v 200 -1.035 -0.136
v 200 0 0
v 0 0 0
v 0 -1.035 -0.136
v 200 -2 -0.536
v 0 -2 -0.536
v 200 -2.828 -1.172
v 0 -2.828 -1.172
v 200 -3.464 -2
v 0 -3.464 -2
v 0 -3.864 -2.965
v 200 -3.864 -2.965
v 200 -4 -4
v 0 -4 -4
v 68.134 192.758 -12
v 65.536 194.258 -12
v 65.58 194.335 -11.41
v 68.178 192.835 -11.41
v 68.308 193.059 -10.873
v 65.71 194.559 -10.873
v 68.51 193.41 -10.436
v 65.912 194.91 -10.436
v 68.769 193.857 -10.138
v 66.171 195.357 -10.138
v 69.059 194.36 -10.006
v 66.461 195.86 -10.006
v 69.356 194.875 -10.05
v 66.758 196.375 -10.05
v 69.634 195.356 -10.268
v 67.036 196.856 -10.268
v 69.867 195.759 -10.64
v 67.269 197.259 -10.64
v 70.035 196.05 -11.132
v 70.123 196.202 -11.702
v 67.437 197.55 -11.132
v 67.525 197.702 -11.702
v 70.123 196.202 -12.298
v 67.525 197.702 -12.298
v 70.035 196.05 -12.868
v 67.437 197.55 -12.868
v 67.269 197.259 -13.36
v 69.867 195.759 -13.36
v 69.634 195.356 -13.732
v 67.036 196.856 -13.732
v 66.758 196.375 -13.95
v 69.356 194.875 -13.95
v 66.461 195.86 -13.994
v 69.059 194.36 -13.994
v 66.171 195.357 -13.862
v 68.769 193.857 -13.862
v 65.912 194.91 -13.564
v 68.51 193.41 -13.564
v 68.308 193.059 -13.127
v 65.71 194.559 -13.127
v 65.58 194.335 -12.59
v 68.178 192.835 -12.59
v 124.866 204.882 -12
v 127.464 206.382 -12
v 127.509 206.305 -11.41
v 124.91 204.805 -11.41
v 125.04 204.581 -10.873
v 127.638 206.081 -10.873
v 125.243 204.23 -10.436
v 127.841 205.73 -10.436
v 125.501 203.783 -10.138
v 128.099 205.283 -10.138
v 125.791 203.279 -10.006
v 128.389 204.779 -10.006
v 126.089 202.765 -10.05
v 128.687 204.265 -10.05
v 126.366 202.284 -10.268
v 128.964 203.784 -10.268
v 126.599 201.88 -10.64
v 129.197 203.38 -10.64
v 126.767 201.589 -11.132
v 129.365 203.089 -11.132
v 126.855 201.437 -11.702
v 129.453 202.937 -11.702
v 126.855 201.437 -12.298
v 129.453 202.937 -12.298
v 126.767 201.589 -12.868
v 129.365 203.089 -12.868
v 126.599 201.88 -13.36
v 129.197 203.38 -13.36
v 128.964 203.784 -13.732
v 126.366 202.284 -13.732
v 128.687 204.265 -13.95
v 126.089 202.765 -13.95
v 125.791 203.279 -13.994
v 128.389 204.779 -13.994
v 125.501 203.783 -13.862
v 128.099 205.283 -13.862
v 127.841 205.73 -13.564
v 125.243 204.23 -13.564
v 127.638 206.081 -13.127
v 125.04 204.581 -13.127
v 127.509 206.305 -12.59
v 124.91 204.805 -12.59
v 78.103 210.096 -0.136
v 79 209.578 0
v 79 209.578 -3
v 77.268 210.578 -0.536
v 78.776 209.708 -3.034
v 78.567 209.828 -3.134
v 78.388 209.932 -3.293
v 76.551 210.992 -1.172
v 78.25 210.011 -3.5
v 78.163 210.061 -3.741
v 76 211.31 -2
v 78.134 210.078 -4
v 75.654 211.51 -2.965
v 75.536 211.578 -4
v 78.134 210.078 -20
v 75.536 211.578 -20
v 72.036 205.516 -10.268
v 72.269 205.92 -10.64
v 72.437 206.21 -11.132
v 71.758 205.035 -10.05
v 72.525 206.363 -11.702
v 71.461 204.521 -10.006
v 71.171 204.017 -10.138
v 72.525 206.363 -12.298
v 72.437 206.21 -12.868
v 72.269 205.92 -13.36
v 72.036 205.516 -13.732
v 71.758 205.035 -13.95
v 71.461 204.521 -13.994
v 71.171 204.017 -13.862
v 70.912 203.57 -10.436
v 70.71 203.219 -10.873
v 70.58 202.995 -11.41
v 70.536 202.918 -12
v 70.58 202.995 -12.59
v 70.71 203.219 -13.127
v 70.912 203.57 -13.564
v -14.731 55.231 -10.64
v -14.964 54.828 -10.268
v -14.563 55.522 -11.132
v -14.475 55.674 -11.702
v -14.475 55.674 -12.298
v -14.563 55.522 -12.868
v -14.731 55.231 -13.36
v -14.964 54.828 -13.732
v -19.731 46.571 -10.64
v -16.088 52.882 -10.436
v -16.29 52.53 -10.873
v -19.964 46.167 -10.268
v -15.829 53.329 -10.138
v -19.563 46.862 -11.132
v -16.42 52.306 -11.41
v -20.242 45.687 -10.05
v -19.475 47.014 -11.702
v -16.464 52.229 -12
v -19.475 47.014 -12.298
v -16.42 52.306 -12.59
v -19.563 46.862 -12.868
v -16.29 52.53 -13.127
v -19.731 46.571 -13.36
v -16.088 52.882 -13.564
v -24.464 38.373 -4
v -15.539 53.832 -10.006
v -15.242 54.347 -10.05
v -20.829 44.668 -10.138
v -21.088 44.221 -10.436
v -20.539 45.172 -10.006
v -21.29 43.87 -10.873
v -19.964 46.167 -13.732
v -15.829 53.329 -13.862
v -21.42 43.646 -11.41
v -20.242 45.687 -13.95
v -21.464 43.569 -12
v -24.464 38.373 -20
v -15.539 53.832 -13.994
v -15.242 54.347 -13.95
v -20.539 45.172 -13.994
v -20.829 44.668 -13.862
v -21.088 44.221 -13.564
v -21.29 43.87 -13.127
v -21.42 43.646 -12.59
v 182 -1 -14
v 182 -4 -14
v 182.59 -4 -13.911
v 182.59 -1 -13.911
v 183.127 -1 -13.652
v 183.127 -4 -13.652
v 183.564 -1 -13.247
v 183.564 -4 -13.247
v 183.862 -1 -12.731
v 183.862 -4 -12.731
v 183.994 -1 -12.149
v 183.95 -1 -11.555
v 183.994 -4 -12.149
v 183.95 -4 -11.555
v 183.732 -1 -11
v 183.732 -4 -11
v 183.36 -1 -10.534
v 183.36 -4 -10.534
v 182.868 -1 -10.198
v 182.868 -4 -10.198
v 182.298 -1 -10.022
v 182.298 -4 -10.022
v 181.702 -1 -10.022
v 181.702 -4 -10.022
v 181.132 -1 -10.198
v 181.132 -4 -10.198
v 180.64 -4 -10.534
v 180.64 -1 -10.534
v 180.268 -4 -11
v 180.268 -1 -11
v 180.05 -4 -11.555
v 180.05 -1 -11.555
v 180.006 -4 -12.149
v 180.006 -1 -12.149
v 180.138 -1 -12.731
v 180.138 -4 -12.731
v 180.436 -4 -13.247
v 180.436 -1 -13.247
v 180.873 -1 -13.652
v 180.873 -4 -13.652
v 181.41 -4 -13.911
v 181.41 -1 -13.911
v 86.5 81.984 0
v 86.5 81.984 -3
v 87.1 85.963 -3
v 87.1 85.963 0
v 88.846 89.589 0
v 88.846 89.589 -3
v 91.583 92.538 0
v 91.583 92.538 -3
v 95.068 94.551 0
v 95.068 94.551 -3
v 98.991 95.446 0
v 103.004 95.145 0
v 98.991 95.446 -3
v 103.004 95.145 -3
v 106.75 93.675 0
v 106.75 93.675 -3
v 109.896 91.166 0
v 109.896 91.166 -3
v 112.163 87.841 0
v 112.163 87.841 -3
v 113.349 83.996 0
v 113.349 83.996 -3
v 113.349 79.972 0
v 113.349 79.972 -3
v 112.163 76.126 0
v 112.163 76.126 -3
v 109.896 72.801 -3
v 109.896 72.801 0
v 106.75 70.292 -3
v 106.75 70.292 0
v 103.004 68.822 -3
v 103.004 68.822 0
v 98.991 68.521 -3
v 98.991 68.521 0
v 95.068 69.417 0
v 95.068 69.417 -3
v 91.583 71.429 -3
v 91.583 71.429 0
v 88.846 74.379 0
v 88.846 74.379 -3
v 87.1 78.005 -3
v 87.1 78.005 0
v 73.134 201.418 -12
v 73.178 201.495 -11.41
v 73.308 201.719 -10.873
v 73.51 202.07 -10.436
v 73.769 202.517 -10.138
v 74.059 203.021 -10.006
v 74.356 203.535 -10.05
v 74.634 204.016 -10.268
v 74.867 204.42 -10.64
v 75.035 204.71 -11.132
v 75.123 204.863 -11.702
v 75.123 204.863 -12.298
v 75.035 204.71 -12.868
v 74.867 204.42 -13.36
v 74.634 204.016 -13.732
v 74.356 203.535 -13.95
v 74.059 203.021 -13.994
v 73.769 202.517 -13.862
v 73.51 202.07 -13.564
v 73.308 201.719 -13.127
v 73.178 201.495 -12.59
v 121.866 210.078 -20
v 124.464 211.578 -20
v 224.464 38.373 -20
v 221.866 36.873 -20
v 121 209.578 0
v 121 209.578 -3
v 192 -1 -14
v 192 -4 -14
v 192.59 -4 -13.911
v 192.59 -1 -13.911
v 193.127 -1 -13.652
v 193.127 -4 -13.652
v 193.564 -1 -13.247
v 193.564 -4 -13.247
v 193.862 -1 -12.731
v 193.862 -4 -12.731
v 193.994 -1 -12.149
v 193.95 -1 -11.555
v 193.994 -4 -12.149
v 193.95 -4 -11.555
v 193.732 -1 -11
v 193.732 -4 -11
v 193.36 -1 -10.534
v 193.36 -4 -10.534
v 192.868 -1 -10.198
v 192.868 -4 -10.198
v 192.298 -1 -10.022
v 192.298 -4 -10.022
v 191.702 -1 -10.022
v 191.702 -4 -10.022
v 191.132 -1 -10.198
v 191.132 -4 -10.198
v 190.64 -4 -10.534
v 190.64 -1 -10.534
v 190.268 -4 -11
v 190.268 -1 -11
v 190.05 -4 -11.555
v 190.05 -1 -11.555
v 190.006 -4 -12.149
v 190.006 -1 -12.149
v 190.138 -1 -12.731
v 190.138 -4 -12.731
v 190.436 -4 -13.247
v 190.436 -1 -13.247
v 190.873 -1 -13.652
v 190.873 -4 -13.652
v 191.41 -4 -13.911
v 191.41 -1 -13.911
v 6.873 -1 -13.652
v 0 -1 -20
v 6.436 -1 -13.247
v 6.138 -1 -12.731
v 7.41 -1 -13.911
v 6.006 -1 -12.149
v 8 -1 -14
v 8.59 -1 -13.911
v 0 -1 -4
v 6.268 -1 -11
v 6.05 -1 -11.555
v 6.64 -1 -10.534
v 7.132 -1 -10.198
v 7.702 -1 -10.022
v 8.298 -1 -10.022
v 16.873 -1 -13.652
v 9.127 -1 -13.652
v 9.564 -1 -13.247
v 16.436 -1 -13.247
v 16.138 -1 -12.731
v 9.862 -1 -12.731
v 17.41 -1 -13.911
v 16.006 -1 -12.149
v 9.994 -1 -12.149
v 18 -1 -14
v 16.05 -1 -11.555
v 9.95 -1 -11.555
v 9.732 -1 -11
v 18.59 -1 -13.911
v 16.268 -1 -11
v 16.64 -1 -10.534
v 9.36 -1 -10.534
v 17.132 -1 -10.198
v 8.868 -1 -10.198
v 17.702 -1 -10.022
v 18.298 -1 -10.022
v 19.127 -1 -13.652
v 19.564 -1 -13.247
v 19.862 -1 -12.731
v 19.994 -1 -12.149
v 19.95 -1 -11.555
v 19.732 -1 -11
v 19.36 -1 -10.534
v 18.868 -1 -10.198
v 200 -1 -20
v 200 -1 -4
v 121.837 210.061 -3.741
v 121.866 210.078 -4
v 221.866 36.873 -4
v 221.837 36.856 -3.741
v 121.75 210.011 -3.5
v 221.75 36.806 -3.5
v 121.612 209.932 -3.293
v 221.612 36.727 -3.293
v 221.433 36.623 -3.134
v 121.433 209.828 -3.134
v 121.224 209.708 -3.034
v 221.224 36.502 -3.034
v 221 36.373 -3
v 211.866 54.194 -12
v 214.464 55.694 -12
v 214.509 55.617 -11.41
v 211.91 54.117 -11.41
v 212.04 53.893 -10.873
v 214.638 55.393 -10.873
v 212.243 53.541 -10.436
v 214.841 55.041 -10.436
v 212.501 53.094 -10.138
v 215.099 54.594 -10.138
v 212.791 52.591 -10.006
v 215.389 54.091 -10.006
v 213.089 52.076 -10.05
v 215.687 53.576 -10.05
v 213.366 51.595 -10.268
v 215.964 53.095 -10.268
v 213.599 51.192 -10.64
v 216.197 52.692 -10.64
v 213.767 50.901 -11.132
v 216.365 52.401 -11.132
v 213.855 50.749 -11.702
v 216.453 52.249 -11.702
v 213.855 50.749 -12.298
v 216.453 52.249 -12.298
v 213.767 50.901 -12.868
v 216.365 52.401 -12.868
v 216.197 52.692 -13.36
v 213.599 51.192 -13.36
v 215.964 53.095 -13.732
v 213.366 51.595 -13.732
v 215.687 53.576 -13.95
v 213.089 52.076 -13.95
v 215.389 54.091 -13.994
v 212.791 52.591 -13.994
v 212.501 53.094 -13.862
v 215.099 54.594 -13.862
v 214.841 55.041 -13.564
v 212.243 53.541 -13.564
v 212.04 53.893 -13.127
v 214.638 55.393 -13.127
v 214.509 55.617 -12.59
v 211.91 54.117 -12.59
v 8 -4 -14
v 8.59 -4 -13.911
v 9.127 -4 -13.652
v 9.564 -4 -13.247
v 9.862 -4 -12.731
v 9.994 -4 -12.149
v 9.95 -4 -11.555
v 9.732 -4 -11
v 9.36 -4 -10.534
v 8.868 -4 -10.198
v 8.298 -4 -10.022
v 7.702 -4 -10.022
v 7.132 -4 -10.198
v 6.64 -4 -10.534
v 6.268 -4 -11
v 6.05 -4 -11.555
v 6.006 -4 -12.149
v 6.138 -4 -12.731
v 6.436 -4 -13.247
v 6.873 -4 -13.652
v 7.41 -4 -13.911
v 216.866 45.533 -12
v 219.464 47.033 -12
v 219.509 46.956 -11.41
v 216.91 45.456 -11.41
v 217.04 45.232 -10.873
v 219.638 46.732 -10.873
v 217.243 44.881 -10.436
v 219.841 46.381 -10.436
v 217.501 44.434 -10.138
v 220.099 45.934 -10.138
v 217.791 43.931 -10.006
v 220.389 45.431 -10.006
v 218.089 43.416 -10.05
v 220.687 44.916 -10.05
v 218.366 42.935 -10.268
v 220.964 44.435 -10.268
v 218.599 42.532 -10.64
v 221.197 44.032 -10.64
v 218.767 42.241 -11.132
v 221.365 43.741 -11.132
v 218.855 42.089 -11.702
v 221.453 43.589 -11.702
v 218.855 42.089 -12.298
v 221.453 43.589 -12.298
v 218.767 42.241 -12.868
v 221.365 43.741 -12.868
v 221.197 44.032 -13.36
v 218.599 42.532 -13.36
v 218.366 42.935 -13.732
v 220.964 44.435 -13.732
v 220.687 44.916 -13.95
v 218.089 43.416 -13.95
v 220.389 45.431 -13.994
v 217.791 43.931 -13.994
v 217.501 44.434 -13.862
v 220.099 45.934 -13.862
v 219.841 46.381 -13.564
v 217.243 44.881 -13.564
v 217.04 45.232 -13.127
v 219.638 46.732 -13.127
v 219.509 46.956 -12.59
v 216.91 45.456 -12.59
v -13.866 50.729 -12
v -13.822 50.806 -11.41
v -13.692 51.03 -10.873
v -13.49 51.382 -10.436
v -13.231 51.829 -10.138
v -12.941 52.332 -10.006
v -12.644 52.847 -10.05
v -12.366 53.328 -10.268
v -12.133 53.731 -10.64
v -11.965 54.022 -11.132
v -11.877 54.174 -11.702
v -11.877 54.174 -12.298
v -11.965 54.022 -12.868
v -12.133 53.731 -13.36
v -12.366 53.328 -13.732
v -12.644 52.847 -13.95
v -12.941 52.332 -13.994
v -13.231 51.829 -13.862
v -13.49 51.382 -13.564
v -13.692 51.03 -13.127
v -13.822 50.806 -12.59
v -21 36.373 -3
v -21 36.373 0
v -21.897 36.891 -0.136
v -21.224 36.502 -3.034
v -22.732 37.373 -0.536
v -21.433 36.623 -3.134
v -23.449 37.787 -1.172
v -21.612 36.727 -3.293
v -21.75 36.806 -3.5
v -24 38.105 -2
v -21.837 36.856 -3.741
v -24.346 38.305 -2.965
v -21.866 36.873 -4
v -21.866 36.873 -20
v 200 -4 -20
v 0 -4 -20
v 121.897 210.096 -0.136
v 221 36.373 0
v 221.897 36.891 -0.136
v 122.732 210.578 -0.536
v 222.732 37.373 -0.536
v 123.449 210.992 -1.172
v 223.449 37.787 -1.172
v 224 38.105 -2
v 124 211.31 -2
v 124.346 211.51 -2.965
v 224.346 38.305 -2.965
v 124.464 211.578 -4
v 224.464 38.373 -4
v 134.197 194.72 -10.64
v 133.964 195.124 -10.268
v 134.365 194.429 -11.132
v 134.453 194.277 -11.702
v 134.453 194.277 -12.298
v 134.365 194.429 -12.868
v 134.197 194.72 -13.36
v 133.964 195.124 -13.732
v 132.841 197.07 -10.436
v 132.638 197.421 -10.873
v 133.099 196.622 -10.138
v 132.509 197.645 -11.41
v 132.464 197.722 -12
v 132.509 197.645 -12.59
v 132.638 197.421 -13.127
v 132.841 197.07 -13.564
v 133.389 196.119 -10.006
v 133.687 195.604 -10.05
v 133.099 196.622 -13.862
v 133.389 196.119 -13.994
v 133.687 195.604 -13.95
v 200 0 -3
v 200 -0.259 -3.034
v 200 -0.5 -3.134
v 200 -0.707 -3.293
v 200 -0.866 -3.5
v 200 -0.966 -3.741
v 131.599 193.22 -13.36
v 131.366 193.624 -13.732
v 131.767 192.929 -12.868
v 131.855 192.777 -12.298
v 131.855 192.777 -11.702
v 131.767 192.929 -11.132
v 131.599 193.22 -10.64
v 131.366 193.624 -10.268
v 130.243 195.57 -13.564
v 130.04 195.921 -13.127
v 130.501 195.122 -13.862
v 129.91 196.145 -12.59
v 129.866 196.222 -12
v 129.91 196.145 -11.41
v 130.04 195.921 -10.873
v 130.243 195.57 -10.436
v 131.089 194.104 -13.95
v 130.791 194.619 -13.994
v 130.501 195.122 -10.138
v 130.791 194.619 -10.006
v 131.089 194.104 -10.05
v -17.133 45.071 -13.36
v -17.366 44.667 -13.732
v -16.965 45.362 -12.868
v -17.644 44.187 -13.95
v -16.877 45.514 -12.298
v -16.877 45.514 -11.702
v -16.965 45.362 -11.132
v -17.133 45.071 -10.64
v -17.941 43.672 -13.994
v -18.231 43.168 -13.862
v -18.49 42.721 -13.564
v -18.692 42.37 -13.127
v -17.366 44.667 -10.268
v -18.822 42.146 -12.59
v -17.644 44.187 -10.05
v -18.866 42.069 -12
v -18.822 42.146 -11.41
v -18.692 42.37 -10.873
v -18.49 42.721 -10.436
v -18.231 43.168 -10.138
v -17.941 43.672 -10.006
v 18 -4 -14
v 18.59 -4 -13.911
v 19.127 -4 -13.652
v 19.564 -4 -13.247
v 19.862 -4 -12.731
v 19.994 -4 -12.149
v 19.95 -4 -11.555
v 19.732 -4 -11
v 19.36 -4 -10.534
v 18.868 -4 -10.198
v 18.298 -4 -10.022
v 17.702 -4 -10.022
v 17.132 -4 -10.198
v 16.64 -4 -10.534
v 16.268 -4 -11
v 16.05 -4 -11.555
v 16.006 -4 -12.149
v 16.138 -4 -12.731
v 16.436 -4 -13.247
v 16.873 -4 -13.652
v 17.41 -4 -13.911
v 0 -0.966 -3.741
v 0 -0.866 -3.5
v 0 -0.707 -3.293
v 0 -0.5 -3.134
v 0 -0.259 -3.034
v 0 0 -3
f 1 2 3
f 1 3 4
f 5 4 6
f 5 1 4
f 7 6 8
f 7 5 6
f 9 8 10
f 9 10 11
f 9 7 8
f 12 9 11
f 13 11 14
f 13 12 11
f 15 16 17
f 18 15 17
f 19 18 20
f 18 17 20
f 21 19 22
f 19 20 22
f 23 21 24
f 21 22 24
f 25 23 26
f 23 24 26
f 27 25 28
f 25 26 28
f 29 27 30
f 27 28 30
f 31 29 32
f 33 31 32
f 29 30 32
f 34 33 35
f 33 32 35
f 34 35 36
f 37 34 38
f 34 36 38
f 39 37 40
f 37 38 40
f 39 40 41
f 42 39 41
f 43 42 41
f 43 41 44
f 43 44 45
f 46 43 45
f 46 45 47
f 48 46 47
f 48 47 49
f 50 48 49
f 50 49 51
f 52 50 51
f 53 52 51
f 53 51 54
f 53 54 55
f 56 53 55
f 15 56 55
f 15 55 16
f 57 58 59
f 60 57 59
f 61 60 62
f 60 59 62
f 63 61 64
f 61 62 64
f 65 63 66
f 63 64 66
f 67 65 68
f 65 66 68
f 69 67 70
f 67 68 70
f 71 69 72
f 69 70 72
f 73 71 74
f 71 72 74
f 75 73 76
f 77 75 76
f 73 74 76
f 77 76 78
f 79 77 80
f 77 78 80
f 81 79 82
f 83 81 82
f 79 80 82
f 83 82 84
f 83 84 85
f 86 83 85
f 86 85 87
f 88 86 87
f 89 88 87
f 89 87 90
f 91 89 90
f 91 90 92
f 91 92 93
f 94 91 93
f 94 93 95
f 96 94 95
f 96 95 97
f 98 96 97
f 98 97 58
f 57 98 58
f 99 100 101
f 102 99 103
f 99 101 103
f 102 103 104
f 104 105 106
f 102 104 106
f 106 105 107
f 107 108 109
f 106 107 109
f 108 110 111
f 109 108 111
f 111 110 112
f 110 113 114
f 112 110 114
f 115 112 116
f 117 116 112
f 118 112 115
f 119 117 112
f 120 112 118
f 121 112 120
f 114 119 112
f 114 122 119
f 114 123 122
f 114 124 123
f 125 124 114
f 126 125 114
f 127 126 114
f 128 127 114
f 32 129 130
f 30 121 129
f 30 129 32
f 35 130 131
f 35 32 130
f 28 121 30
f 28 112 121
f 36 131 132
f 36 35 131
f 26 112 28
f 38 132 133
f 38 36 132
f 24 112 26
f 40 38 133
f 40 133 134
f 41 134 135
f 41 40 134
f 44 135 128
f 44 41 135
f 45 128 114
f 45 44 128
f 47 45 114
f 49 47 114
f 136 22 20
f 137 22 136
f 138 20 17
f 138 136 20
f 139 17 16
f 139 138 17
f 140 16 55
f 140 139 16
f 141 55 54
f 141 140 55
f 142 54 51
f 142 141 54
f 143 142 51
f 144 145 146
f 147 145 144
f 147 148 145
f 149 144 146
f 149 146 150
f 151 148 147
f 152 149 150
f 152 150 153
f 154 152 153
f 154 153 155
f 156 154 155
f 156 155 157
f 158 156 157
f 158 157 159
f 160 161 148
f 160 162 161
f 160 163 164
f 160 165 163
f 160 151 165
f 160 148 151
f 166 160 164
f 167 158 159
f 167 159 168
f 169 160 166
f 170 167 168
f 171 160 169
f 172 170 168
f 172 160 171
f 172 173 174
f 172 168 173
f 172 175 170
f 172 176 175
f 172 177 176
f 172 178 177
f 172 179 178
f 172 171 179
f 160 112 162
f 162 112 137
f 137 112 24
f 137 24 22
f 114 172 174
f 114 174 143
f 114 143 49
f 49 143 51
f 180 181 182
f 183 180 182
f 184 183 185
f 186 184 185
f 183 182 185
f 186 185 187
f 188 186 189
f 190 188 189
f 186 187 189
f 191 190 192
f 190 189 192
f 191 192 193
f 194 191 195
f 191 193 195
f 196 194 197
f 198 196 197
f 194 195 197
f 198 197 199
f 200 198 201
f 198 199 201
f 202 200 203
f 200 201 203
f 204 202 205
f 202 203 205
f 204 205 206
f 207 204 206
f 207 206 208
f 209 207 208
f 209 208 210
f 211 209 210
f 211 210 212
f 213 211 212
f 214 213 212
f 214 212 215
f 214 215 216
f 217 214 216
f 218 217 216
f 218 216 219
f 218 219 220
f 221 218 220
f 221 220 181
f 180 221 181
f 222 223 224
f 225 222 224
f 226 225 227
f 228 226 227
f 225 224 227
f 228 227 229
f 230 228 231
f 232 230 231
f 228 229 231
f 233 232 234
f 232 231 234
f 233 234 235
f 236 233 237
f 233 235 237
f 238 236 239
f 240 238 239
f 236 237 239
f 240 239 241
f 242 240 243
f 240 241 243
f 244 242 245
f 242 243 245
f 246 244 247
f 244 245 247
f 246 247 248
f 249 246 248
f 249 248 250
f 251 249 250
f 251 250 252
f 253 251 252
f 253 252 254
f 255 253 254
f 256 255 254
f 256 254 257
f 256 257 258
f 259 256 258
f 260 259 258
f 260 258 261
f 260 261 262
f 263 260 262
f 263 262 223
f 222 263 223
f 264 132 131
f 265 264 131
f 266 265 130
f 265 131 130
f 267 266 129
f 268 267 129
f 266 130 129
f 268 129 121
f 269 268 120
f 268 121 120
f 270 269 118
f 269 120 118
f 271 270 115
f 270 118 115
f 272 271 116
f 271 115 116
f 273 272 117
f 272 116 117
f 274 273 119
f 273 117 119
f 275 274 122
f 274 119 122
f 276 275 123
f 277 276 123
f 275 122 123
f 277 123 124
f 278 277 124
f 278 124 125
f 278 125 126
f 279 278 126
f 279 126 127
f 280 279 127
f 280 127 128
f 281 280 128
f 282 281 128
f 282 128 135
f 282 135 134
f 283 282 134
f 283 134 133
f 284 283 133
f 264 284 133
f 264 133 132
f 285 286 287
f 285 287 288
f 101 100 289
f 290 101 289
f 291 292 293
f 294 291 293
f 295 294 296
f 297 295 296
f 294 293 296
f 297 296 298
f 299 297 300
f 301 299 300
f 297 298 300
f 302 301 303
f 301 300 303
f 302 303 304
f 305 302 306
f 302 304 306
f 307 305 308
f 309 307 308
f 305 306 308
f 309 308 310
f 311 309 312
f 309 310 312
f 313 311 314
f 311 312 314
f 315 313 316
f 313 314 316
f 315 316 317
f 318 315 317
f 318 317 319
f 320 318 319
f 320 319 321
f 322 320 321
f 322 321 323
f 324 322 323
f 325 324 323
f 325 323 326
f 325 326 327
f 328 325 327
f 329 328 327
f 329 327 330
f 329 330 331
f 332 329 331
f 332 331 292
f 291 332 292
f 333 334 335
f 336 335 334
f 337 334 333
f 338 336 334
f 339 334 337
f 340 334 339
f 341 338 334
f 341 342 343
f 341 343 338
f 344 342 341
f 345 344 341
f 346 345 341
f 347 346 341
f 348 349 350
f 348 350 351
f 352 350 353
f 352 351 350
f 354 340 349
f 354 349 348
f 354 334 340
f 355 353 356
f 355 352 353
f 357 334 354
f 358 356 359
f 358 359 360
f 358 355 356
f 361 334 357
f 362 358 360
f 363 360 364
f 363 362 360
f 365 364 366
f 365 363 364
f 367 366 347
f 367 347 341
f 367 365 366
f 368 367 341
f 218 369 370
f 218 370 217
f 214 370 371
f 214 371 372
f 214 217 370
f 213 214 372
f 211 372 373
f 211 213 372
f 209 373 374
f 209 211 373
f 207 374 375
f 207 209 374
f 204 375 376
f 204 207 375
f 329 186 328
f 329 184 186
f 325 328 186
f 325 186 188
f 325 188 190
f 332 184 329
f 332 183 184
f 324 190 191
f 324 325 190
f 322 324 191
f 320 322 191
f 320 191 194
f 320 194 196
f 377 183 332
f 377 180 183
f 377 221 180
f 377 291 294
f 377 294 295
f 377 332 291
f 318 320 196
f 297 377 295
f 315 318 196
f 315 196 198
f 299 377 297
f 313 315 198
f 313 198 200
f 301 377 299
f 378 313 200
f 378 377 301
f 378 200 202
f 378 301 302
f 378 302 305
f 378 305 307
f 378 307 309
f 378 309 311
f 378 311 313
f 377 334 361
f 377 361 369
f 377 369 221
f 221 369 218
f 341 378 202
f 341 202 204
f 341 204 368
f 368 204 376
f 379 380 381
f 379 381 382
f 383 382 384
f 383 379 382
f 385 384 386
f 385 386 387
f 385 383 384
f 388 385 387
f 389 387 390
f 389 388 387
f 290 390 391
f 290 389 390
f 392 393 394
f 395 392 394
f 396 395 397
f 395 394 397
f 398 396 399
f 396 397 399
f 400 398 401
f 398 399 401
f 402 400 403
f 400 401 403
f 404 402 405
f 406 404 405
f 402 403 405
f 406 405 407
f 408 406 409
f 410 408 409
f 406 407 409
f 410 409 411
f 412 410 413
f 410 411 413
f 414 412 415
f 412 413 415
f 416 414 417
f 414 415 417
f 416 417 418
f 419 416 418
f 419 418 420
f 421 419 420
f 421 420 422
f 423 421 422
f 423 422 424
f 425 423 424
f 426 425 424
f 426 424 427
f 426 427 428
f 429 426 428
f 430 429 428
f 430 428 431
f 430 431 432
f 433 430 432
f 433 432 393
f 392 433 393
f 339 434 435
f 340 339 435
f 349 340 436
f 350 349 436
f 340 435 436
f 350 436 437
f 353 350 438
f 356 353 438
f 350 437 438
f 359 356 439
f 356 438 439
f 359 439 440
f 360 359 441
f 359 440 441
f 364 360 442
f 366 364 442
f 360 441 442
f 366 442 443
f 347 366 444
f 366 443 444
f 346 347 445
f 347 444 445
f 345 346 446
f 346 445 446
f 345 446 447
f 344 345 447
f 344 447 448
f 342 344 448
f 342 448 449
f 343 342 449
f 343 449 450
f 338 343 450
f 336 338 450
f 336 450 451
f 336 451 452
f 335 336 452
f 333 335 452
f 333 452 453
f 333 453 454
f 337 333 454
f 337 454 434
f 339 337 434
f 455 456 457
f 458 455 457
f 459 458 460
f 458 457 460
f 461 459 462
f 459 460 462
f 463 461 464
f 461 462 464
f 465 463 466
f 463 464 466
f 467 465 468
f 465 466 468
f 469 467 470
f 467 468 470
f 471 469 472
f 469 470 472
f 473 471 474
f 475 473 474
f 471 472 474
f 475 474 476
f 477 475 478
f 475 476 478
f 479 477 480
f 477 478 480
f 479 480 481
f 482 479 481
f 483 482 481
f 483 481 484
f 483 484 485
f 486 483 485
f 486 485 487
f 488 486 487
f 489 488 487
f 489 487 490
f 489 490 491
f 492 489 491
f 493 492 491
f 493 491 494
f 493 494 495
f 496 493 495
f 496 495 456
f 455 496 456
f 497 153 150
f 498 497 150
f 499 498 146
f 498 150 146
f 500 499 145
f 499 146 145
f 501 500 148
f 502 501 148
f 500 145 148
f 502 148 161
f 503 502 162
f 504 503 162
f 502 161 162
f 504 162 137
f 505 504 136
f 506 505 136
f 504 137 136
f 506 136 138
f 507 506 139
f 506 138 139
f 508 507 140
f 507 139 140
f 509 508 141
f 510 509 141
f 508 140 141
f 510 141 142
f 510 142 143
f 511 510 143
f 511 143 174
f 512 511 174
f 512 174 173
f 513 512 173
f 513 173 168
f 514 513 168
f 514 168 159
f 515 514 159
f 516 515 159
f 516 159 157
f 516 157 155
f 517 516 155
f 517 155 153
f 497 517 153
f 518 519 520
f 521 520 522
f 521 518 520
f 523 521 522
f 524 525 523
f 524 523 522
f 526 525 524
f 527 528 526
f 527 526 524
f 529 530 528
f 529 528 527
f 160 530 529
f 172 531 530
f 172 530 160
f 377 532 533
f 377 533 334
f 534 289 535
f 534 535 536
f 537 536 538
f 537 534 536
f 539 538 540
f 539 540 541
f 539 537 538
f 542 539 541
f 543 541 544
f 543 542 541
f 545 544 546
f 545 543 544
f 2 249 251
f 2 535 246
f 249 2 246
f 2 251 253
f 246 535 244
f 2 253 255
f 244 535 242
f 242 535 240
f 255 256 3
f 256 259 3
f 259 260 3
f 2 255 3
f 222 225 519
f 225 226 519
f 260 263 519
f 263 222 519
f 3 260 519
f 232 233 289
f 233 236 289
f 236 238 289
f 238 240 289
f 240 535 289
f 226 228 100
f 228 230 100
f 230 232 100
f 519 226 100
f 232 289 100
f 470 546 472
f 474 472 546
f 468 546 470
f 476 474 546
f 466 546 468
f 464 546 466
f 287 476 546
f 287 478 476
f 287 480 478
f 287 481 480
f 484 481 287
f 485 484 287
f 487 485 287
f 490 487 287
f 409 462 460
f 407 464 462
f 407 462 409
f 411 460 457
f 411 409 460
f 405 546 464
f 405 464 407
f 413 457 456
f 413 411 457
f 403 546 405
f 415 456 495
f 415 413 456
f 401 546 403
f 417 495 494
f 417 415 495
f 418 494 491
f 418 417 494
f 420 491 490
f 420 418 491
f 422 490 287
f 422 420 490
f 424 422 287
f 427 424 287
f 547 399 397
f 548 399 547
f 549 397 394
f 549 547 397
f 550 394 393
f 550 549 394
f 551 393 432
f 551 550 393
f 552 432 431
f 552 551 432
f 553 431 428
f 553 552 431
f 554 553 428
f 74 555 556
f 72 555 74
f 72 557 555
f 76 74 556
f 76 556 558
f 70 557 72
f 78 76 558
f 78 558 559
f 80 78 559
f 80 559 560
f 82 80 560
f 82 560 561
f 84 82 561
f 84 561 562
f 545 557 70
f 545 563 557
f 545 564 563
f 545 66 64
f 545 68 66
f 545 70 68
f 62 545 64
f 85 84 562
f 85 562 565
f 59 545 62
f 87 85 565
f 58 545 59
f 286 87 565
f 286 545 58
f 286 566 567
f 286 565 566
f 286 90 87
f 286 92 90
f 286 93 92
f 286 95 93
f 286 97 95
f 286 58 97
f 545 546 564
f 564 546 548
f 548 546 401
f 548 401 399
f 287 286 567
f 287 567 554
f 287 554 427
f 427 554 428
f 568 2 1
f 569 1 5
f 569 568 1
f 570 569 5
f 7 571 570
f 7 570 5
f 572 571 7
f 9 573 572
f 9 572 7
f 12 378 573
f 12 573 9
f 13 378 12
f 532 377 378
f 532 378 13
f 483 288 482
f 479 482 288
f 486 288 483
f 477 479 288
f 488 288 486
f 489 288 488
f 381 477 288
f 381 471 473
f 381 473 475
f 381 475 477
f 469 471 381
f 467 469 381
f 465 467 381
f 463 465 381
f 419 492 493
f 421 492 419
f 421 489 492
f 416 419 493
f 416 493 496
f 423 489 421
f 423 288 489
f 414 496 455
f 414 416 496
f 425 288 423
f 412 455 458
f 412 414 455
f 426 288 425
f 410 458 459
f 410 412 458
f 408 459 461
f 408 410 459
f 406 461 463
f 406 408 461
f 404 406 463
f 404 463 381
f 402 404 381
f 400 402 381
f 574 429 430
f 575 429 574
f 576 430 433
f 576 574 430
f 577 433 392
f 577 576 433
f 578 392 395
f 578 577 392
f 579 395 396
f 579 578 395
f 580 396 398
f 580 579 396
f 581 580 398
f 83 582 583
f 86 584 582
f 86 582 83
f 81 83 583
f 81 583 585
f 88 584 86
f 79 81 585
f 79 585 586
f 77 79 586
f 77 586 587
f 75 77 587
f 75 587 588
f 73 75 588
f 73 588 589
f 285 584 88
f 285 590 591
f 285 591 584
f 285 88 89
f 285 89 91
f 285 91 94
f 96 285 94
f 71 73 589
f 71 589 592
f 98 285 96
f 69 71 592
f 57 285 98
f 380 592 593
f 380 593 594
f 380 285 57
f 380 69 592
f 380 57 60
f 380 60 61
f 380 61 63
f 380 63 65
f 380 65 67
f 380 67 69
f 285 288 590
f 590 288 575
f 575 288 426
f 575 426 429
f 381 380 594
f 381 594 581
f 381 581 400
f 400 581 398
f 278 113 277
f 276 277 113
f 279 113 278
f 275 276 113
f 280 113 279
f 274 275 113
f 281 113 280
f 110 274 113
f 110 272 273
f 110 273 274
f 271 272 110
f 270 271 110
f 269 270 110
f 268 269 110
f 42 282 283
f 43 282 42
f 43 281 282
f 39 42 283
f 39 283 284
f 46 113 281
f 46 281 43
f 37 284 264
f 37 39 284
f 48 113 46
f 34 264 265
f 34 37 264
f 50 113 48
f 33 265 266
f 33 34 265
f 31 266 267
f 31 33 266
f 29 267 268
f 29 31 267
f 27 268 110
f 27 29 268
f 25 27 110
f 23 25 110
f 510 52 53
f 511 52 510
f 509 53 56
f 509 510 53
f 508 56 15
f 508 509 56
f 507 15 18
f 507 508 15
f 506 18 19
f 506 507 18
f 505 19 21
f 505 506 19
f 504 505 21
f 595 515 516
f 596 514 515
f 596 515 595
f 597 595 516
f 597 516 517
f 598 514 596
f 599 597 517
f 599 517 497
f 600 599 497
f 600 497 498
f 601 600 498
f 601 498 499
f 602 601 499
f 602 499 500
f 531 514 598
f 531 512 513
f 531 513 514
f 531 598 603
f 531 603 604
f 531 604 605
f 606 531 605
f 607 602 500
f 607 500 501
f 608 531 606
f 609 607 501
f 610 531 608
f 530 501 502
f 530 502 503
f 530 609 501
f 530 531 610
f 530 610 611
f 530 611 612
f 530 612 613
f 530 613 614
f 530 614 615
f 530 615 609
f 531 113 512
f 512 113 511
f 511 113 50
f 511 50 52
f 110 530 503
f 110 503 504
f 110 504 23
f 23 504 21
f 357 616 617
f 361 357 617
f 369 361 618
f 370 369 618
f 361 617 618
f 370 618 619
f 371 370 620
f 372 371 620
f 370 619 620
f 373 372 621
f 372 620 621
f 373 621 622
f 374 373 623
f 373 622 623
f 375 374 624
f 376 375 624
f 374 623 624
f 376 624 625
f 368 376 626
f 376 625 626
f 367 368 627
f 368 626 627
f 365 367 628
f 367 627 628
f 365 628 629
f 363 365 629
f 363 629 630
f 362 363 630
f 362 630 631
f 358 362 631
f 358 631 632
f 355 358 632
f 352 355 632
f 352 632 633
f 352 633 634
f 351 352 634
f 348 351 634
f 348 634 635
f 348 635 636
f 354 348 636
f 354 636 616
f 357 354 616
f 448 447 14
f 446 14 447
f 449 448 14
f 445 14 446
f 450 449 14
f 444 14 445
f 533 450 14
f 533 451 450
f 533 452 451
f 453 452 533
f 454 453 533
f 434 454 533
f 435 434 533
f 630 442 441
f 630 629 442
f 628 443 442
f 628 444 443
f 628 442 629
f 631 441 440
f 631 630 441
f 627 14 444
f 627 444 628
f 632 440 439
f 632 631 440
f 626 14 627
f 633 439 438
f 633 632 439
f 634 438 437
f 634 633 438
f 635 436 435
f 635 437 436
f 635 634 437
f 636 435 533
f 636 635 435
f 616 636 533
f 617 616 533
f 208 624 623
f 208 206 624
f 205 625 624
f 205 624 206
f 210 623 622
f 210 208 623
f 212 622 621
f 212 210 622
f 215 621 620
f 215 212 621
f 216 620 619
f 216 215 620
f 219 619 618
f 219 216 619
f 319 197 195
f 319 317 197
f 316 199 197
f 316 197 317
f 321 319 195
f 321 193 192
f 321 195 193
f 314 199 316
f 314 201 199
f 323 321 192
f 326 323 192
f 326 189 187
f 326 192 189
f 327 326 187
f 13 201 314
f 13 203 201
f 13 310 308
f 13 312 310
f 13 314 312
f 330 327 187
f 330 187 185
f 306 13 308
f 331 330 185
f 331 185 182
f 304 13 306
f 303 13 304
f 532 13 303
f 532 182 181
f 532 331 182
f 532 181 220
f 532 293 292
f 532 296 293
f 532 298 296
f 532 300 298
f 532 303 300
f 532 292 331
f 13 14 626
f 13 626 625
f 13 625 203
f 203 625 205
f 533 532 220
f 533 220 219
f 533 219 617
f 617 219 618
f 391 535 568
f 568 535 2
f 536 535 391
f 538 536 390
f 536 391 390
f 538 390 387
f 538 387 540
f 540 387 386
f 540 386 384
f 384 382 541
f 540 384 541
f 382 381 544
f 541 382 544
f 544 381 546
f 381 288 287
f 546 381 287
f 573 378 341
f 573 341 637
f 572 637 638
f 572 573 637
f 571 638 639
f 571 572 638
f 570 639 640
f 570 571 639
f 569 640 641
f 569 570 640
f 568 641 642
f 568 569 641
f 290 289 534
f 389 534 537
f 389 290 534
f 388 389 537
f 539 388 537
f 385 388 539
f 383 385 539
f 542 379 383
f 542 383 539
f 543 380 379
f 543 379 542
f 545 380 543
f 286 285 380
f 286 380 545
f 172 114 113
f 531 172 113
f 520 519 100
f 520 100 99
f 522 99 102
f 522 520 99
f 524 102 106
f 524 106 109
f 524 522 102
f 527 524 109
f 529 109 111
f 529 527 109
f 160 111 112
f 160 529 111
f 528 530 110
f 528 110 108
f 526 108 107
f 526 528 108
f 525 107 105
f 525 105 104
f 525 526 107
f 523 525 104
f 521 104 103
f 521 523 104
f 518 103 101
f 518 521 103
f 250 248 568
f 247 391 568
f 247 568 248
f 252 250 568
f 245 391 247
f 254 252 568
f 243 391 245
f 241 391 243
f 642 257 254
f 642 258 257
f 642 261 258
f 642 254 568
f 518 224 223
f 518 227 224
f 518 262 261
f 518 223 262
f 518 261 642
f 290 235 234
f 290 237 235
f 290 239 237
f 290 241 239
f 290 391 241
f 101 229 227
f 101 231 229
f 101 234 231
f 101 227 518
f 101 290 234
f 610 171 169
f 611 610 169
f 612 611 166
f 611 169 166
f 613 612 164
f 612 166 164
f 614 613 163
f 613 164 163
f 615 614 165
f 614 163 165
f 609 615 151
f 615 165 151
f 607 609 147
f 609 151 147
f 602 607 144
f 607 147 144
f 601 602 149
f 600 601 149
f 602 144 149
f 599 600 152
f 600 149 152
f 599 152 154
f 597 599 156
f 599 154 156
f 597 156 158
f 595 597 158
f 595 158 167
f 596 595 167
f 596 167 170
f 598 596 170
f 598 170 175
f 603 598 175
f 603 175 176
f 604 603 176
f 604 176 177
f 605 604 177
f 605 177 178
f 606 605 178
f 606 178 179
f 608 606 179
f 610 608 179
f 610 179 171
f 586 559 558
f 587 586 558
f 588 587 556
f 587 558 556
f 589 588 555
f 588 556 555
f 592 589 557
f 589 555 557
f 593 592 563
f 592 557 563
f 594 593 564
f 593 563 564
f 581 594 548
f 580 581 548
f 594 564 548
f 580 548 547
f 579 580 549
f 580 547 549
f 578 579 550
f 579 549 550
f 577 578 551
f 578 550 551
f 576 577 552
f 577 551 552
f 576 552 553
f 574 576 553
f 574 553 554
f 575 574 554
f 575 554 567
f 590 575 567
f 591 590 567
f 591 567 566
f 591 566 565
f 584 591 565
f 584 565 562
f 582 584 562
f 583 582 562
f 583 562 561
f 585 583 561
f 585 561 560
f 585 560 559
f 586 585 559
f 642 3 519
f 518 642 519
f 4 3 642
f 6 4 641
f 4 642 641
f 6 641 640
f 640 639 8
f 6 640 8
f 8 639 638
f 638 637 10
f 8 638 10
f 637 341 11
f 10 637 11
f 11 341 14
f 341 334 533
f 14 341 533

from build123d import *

# Parameters (mm, degrees)
SM_BASE_FLANGE_3_DEPTH        = 3
SM_EDGE_FLANGE_6_DEPTH        = 200
SM_EDGE_FLANGE_6_BEND_DEPTH   = 200
SM_EDGE_FLANGE_6_BEND_2_DEPTH = 200
CUT_EXTRUDE_4_REACH           = 325.007
SKETCH_47_R                   = 2
CUT_EXTRUDE_6_REACH           = 239.77
SKETCH_50_R                   = 2
CUT_EXTRUDE_7_REACH           = 313.862
SKETCH_51_R                   = 2
CUT_EXTRUDE_8_REACH           = 310.931
SKETCH_52_R                   = 13.5


# Sheet-metal steps are written as plain solids
with BuildPart() as part:
    # Эскиз10 → Базовая кромка3 (new body)
    with BuildSketch(Plane.XY):
        Polygon((0, 0), (-21, 36.373066959), (79, 209.578147716), (121, 209.578147716), (221, 36.373066959), (200, 0), align=None)
    extrude(amount=-SM_BASE_FLANGE_3_DEPTH)

    # Ребро-кромка6 section (across the edge) → Ребро-кромка6 (add)
    with BuildSketch(Plane(origin=(-21.866025404, 36.873066959, -3), x_dir=(0.8660254037844437, -0.4999999999999915, -3.4914813388431334e-15), z_dir=(0.4999999999999915, 0.8660254037844437, 0))):
        with BuildLine():
            Line((-3, 1), (-3, 17))
            Line((-3, 17), (0, 17))
            Line((0, 17), (0, 1))
            ThreePointArc((0, 1), (0.292893219, 0.292893219), (1, 0))
            Line((1, 0), (1, -3))
            ThreePointArc((1, -3), (-1.828427125, -1.828427125), (-3, 1))
        make_face()
    extrude(amount=SM_EDGE_FLANGE_6_DEPTH)

    # Ребро-кромка6 section 2 (across the edge) → Ребро-кромка6 bend (add)
    with BuildSketch(Plane(origin=(121.866025404, 210.078147716, -3), x_dir=(-0.8660254037844362, -0.5000000000000044, -3.491481338843134e-15), z_dir=(0.5000000000000044, -0.8660254037844362, 0))):
        with BuildLine():
            Line((-3, 1), (-3, 17))
            Line((-3, 17), (0, 17))
            Line((0, 17), (0, 1))
            ThreePointArc((0, 1), (0.292893219, 0.292893219), (1, 0))
            Line((1, 0), (1, -3))
            ThreePointArc((1, -3), (-1.828427125, -1.828427125), (-3, 1))
        make_face()
    extrude(amount=SM_EDGE_FLANGE_6_BEND_DEPTH)

    # Ребро-кромка6 section 3 (across the edge) → Ребро-кромка6 bend 2 (add)
    with BuildSketch(Plane(origin=(200, -1, -3), x_dir=(0, 1, 0), z_dir=(-1, 0, 0))):
        with BuildLine():
            Line((-3, 1), (-3, 17))
            Line((-3, 17), (0, 17))
            Line((0, 17), (0, 1))
            ThreePointArc((0, 1), (0.292893219, 0.292893219), (1, 0))
            Line((1, 0), (1, -3))
            ThreePointArc((1, -3), (-1.828427125, -1.828427125), (-3, 1))
        make_face()
    extrude(amount=SM_EDGE_FLANGE_6_BEND_2_DEPTH)

    # Эскиз47 → Вырез-Вытянуть4 (cut, up to next)
    with BuildSketch(Plane(origin=(-34.964101615, 20.186533479, 0), x_dir=(0, 0, 1), z_dir=(-0.866025403784443, 0.4999999999999925, 3.788649256556814e-15)), mode=Mode.PRIVATE) as cut_extrude_4_sk1:
        with Locations(Location((-12, 29, 0), (0, 0, 270))):
            Circle(SKETCH_47_R)
    cut_extrude_4_tool1 = extrude(cut_extrude_4_sk1.sketch, amount=-CUT_EXTRUDE_4_REACH, mode=Mode.PRIVATE) & part.part
    # Эскиз47 → Вырез-Вытянуть4 (cut, up to next)
    with BuildSketch(Plane(origin=(-34.964101615, 20.186533479, 0), x_dir=(0, 0, 1), z_dir=(-0.866025403784443, 0.4999999999999925, 3.788649256556814e-15)), mode=Mode.PRIVATE) as cut_extrude_4_sk2:
        with Locations(Location((-12, 39, 0), (0, 0, 270))):
            Circle(SKETCH_47_R)
    cut_extrude_4_tool2 = extrude(cut_extrude_4_sk2.sketch, amount=-CUT_EXTRUDE_4_REACH, mode=Mode.PRIVATE) & part.part
    # Эскиз47 → Вырез-Вытянуть4 (cut, up to next)
    with BuildSketch(Plane(origin=(-34.964101615, 20.186533479, 0), x_dir=(0, 0, 1), z_dir=(-0.866025403784443, 0.4999999999999925, 3.788649256556814e-15)), mode=Mode.PRIVATE) as cut_extrude_4_sk3:
        with Locations(Location((-12, 203, 0), (0, 0, 270))):
            Circle(SKETCH_47_R)
    cut_extrude_4_tool3 = extrude(cut_extrude_4_sk3.sketch, amount=-CUT_EXTRUDE_4_REACH, mode=Mode.PRIVATE) & part.part
    # Эскиз47 → Вырез-Вытянуть4 (cut, up to next)
    with BuildSketch(Plane(origin=(-34.964101615, 20.186533479, 0), x_dir=(0, 0, 1), z_dir=(-0.866025403784443, 0.4999999999999925, 3.788649256556814e-15)), mode=Mode.PRIVATE) as cut_extrude_4_sk4:
        with Locations(Location((-12, 213, 0), (0, 0, 270))):
            Circle(SKETCH_47_R)
    cut_extrude_4_tool4 = extrude(cut_extrude_4_sk4.sketch, amount=-CUT_EXTRUDE_4_REACH, mode=Mode.PRIVATE) & part.part
    add(cut_extrude_4_tool1.solids().sort_by_distance((-20.464102, 45.30127, -12))[0], mode=Mode.SUBTRACT)
    add(cut_extrude_4_tool2.solids().sort_by_distance((-15.464102, 53.961524, -12))[0], mode=Mode.SUBTRACT)
    add(cut_extrude_4_tool3.solids().sort_by_distance((66.535898, 195.98969, -12))[0], mode=Mode.SUBTRACT)
    add(cut_extrude_4_tool4.solids().sort_by_distance((71.535898, 204.649944, -12))[0], mode=Mode.SUBTRACT)

    # Эскиз50 → Вырез-Вытянуть6 (cut, up to next)
    with BuildSketch(Plane(origin=(184.964101615, 106.789073858, 0), x_dir=(0, 0, -1), z_dir=(0.866025403784436, 0.5000000000000047, 3.0623287353932815e-15)), mode=Mode.PRIVATE) as cut_extrude_6_sk1:
        with Locations(Location((12, -71, 0), (0, 0, 90))):
            Circle(SKETCH_50_R)
    cut_extrude_6_tool1 = extrude(cut_extrude_6_sk1.sketch, amount=-CUT_EXTRUDE_6_REACH, mode=Mode.PRIVATE) & part.part
    # Эскиз50 → Вырез-Вытянуть6 (cut, up to next)
    with BuildSketch(Plane(origin=(184.964101615, 106.789073858, 0), x_dir=(0, 0, -1), z_dir=(0.866025403784436, 0.5000000000000047, 3.0623287353932815e-15)), mode=Mode.PRIVATE) as cut_extrude_6_sk2:
        with Locations(Location((12, -61, 0), (0, 0, 90))):
            Circle(SKETCH_50_R)
    cut_extrude_6_tool2 = extrude(cut_extrude_6_sk2.sketch, amount=-CUT_EXTRUDE_6_REACH, mode=Mode.PRIVATE) & part.part
    # Эскиз50 → Вырез-Вытянуть6 (cut, up to next)
    with BuildSketch(Plane(origin=(184.964101615, 106.789073858, 0), x_dir=(0, 0, -1), z_dir=(0.866025403784436, 0.5000000000000047, 3.0623287353932815e-15)), mode=Mode.PRIVATE) as cut_extrude_6_sk3:
        with Locations(Location((12, 103, 0), (0, 0, 90))):
            Circle(SKETCH_50_R)
    cut_extrude_6_tool3 = extrude(cut_extrude_6_sk3.sketch, amount=-CUT_EXTRUDE_6_REACH, mode=Mode.PRIVATE) & part.part
    # Эскиз50 → Вырез-Вытянуть6 (cut, up to next)
    with BuildSketch(Plane(origin=(184.964101615, 106.789073858, 0), x_dir=(0, 0, -1), z_dir=(0.866025403784436, 0.5000000000000047, 3.0623287353932815e-15)), mode=Mode.PRIVATE) as cut_extrude_6_sk4:
        with Locations(Location((12, 113, 0), (0, 0, 90))):
            Circle(SKETCH_50_R)
    cut_extrude_6_tool4 = extrude(cut_extrude_6_sk4.sketch, amount=-CUT_EXTRUDE_6_REACH, mode=Mode.PRIVATE) & part.part
    add(cut_extrude_6_tool1.solids().sort_by_distance((220.464102, 45.30127, -12))[0], mode=Mode.SUBTRACT)
    add(cut_extrude_6_tool2.solids().sort_by_distance((215.464102, 53.961524, -12))[0], mode=Mode.SUBTRACT)
    add(cut_extrude_6_tool3.solids().sort_by_distance((133.464102, 195.98969, -12))[0], mode=Mode.SUBTRACT)
    add(cut_extrude_6_tool4.solids().sort_by_distance((128.464102, 204.649944, -12))[0], mode=Mode.SUBTRACT)

    # Эскиз51 → Вырез-Вытянуть7 (cut, up to next)
    with BuildSketch(Plane.XZ.offset(4), mode=Mode.PRIVATE) as cut_extrude_7_sk1:
        with Locations(Location((192, -12, 0), (0, 0, 270))):
            Circle(SKETCH_51_R)
    cut_extrude_7_tool1 = extrude(cut_extrude_7_sk1.sketch, amount=-CUT_EXTRUDE_7_REACH, mode=Mode.PRIVATE) & part.part
    # Эскиз51 → Вырез-Вытянуть7 (cut, up to next)
    with BuildSketch(Plane.XZ.offset(4), mode=Mode.PRIVATE) as cut_extrude_7_sk2:
        with Locations(Location((182, -12, 0), (0, 0, 270))):
            Circle(SKETCH_51_R)
    cut_extrude_7_tool2 = extrude(cut_extrude_7_sk2.sketch, amount=-CUT_EXTRUDE_7_REACH, mode=Mode.PRIVATE) & part.part
    # Эскиз51 → Вырез-Вытянуть7 (cut, up to next)
    with BuildSketch(Plane.XZ.offset(4), mode=Mode.PRIVATE) as cut_extrude_7_sk3:
        with Locations(Location((18, -12, 0), (0, 0, 270))):
            Circle(SKETCH_51_R)
    cut_extrude_7_tool3 = extrude(cut_extrude_7_sk3.sketch, amount=-CUT_EXTRUDE_7_REACH, mode=Mode.PRIVATE) & part.part
    # Эскиз51 → Вырез-Вытянуть7 (cut, up to next)
    with BuildSketch(Plane.XZ.offset(4), mode=Mode.PRIVATE) as cut_extrude_7_sk4:
        with Locations(Location((8, -12, 0), (0, 0, 270))):
            Circle(SKETCH_51_R)
    cut_extrude_7_tool4 = extrude(cut_extrude_7_sk4.sketch, amount=-CUT_EXTRUDE_7_REACH, mode=Mode.PRIVATE) & part.part
    add(cut_extrude_7_tool1.solids().sort_by_distance((192, -4, -12))[0], mode=Mode.SUBTRACT)
    add(cut_extrude_7_tool2.solids().sort_by_distance((182, -4, -12))[0], mode=Mode.SUBTRACT)
    add(cut_extrude_7_tool3.solids().sort_by_distance((18, -4, -12))[0], mode=Mode.SUBTRACT)
    add(cut_extrude_7_tool4.solids().sort_by_distance((8, -4, -12))[0], mode=Mode.SUBTRACT)

    # Эскиз52 → Вырез-Вытянуть8 (cut, up to next)
    with BuildSketch(Plane(origin=(0, 0, -3), x_dir=(-1, 0, 0), z_dir=(0, 0, -1)), mode=Mode.PRIVATE) as cut_extrude_8_sk1:
        with Locations((-100, 81.983738225)):
            Circle(SKETCH_52_R)
    cut_extrude_8_tool1 = extrude(cut_extrude_8_sk1.sketch, amount=-CUT_EXTRUDE_8_REACH, mode=Mode.PRIVATE) & part.part
    add(cut_extrude_8_tool1.solids().sort_by_distance((100, 81.983738, -3))[0], mode=Mode.SUBTRACT)


solid = part.part
